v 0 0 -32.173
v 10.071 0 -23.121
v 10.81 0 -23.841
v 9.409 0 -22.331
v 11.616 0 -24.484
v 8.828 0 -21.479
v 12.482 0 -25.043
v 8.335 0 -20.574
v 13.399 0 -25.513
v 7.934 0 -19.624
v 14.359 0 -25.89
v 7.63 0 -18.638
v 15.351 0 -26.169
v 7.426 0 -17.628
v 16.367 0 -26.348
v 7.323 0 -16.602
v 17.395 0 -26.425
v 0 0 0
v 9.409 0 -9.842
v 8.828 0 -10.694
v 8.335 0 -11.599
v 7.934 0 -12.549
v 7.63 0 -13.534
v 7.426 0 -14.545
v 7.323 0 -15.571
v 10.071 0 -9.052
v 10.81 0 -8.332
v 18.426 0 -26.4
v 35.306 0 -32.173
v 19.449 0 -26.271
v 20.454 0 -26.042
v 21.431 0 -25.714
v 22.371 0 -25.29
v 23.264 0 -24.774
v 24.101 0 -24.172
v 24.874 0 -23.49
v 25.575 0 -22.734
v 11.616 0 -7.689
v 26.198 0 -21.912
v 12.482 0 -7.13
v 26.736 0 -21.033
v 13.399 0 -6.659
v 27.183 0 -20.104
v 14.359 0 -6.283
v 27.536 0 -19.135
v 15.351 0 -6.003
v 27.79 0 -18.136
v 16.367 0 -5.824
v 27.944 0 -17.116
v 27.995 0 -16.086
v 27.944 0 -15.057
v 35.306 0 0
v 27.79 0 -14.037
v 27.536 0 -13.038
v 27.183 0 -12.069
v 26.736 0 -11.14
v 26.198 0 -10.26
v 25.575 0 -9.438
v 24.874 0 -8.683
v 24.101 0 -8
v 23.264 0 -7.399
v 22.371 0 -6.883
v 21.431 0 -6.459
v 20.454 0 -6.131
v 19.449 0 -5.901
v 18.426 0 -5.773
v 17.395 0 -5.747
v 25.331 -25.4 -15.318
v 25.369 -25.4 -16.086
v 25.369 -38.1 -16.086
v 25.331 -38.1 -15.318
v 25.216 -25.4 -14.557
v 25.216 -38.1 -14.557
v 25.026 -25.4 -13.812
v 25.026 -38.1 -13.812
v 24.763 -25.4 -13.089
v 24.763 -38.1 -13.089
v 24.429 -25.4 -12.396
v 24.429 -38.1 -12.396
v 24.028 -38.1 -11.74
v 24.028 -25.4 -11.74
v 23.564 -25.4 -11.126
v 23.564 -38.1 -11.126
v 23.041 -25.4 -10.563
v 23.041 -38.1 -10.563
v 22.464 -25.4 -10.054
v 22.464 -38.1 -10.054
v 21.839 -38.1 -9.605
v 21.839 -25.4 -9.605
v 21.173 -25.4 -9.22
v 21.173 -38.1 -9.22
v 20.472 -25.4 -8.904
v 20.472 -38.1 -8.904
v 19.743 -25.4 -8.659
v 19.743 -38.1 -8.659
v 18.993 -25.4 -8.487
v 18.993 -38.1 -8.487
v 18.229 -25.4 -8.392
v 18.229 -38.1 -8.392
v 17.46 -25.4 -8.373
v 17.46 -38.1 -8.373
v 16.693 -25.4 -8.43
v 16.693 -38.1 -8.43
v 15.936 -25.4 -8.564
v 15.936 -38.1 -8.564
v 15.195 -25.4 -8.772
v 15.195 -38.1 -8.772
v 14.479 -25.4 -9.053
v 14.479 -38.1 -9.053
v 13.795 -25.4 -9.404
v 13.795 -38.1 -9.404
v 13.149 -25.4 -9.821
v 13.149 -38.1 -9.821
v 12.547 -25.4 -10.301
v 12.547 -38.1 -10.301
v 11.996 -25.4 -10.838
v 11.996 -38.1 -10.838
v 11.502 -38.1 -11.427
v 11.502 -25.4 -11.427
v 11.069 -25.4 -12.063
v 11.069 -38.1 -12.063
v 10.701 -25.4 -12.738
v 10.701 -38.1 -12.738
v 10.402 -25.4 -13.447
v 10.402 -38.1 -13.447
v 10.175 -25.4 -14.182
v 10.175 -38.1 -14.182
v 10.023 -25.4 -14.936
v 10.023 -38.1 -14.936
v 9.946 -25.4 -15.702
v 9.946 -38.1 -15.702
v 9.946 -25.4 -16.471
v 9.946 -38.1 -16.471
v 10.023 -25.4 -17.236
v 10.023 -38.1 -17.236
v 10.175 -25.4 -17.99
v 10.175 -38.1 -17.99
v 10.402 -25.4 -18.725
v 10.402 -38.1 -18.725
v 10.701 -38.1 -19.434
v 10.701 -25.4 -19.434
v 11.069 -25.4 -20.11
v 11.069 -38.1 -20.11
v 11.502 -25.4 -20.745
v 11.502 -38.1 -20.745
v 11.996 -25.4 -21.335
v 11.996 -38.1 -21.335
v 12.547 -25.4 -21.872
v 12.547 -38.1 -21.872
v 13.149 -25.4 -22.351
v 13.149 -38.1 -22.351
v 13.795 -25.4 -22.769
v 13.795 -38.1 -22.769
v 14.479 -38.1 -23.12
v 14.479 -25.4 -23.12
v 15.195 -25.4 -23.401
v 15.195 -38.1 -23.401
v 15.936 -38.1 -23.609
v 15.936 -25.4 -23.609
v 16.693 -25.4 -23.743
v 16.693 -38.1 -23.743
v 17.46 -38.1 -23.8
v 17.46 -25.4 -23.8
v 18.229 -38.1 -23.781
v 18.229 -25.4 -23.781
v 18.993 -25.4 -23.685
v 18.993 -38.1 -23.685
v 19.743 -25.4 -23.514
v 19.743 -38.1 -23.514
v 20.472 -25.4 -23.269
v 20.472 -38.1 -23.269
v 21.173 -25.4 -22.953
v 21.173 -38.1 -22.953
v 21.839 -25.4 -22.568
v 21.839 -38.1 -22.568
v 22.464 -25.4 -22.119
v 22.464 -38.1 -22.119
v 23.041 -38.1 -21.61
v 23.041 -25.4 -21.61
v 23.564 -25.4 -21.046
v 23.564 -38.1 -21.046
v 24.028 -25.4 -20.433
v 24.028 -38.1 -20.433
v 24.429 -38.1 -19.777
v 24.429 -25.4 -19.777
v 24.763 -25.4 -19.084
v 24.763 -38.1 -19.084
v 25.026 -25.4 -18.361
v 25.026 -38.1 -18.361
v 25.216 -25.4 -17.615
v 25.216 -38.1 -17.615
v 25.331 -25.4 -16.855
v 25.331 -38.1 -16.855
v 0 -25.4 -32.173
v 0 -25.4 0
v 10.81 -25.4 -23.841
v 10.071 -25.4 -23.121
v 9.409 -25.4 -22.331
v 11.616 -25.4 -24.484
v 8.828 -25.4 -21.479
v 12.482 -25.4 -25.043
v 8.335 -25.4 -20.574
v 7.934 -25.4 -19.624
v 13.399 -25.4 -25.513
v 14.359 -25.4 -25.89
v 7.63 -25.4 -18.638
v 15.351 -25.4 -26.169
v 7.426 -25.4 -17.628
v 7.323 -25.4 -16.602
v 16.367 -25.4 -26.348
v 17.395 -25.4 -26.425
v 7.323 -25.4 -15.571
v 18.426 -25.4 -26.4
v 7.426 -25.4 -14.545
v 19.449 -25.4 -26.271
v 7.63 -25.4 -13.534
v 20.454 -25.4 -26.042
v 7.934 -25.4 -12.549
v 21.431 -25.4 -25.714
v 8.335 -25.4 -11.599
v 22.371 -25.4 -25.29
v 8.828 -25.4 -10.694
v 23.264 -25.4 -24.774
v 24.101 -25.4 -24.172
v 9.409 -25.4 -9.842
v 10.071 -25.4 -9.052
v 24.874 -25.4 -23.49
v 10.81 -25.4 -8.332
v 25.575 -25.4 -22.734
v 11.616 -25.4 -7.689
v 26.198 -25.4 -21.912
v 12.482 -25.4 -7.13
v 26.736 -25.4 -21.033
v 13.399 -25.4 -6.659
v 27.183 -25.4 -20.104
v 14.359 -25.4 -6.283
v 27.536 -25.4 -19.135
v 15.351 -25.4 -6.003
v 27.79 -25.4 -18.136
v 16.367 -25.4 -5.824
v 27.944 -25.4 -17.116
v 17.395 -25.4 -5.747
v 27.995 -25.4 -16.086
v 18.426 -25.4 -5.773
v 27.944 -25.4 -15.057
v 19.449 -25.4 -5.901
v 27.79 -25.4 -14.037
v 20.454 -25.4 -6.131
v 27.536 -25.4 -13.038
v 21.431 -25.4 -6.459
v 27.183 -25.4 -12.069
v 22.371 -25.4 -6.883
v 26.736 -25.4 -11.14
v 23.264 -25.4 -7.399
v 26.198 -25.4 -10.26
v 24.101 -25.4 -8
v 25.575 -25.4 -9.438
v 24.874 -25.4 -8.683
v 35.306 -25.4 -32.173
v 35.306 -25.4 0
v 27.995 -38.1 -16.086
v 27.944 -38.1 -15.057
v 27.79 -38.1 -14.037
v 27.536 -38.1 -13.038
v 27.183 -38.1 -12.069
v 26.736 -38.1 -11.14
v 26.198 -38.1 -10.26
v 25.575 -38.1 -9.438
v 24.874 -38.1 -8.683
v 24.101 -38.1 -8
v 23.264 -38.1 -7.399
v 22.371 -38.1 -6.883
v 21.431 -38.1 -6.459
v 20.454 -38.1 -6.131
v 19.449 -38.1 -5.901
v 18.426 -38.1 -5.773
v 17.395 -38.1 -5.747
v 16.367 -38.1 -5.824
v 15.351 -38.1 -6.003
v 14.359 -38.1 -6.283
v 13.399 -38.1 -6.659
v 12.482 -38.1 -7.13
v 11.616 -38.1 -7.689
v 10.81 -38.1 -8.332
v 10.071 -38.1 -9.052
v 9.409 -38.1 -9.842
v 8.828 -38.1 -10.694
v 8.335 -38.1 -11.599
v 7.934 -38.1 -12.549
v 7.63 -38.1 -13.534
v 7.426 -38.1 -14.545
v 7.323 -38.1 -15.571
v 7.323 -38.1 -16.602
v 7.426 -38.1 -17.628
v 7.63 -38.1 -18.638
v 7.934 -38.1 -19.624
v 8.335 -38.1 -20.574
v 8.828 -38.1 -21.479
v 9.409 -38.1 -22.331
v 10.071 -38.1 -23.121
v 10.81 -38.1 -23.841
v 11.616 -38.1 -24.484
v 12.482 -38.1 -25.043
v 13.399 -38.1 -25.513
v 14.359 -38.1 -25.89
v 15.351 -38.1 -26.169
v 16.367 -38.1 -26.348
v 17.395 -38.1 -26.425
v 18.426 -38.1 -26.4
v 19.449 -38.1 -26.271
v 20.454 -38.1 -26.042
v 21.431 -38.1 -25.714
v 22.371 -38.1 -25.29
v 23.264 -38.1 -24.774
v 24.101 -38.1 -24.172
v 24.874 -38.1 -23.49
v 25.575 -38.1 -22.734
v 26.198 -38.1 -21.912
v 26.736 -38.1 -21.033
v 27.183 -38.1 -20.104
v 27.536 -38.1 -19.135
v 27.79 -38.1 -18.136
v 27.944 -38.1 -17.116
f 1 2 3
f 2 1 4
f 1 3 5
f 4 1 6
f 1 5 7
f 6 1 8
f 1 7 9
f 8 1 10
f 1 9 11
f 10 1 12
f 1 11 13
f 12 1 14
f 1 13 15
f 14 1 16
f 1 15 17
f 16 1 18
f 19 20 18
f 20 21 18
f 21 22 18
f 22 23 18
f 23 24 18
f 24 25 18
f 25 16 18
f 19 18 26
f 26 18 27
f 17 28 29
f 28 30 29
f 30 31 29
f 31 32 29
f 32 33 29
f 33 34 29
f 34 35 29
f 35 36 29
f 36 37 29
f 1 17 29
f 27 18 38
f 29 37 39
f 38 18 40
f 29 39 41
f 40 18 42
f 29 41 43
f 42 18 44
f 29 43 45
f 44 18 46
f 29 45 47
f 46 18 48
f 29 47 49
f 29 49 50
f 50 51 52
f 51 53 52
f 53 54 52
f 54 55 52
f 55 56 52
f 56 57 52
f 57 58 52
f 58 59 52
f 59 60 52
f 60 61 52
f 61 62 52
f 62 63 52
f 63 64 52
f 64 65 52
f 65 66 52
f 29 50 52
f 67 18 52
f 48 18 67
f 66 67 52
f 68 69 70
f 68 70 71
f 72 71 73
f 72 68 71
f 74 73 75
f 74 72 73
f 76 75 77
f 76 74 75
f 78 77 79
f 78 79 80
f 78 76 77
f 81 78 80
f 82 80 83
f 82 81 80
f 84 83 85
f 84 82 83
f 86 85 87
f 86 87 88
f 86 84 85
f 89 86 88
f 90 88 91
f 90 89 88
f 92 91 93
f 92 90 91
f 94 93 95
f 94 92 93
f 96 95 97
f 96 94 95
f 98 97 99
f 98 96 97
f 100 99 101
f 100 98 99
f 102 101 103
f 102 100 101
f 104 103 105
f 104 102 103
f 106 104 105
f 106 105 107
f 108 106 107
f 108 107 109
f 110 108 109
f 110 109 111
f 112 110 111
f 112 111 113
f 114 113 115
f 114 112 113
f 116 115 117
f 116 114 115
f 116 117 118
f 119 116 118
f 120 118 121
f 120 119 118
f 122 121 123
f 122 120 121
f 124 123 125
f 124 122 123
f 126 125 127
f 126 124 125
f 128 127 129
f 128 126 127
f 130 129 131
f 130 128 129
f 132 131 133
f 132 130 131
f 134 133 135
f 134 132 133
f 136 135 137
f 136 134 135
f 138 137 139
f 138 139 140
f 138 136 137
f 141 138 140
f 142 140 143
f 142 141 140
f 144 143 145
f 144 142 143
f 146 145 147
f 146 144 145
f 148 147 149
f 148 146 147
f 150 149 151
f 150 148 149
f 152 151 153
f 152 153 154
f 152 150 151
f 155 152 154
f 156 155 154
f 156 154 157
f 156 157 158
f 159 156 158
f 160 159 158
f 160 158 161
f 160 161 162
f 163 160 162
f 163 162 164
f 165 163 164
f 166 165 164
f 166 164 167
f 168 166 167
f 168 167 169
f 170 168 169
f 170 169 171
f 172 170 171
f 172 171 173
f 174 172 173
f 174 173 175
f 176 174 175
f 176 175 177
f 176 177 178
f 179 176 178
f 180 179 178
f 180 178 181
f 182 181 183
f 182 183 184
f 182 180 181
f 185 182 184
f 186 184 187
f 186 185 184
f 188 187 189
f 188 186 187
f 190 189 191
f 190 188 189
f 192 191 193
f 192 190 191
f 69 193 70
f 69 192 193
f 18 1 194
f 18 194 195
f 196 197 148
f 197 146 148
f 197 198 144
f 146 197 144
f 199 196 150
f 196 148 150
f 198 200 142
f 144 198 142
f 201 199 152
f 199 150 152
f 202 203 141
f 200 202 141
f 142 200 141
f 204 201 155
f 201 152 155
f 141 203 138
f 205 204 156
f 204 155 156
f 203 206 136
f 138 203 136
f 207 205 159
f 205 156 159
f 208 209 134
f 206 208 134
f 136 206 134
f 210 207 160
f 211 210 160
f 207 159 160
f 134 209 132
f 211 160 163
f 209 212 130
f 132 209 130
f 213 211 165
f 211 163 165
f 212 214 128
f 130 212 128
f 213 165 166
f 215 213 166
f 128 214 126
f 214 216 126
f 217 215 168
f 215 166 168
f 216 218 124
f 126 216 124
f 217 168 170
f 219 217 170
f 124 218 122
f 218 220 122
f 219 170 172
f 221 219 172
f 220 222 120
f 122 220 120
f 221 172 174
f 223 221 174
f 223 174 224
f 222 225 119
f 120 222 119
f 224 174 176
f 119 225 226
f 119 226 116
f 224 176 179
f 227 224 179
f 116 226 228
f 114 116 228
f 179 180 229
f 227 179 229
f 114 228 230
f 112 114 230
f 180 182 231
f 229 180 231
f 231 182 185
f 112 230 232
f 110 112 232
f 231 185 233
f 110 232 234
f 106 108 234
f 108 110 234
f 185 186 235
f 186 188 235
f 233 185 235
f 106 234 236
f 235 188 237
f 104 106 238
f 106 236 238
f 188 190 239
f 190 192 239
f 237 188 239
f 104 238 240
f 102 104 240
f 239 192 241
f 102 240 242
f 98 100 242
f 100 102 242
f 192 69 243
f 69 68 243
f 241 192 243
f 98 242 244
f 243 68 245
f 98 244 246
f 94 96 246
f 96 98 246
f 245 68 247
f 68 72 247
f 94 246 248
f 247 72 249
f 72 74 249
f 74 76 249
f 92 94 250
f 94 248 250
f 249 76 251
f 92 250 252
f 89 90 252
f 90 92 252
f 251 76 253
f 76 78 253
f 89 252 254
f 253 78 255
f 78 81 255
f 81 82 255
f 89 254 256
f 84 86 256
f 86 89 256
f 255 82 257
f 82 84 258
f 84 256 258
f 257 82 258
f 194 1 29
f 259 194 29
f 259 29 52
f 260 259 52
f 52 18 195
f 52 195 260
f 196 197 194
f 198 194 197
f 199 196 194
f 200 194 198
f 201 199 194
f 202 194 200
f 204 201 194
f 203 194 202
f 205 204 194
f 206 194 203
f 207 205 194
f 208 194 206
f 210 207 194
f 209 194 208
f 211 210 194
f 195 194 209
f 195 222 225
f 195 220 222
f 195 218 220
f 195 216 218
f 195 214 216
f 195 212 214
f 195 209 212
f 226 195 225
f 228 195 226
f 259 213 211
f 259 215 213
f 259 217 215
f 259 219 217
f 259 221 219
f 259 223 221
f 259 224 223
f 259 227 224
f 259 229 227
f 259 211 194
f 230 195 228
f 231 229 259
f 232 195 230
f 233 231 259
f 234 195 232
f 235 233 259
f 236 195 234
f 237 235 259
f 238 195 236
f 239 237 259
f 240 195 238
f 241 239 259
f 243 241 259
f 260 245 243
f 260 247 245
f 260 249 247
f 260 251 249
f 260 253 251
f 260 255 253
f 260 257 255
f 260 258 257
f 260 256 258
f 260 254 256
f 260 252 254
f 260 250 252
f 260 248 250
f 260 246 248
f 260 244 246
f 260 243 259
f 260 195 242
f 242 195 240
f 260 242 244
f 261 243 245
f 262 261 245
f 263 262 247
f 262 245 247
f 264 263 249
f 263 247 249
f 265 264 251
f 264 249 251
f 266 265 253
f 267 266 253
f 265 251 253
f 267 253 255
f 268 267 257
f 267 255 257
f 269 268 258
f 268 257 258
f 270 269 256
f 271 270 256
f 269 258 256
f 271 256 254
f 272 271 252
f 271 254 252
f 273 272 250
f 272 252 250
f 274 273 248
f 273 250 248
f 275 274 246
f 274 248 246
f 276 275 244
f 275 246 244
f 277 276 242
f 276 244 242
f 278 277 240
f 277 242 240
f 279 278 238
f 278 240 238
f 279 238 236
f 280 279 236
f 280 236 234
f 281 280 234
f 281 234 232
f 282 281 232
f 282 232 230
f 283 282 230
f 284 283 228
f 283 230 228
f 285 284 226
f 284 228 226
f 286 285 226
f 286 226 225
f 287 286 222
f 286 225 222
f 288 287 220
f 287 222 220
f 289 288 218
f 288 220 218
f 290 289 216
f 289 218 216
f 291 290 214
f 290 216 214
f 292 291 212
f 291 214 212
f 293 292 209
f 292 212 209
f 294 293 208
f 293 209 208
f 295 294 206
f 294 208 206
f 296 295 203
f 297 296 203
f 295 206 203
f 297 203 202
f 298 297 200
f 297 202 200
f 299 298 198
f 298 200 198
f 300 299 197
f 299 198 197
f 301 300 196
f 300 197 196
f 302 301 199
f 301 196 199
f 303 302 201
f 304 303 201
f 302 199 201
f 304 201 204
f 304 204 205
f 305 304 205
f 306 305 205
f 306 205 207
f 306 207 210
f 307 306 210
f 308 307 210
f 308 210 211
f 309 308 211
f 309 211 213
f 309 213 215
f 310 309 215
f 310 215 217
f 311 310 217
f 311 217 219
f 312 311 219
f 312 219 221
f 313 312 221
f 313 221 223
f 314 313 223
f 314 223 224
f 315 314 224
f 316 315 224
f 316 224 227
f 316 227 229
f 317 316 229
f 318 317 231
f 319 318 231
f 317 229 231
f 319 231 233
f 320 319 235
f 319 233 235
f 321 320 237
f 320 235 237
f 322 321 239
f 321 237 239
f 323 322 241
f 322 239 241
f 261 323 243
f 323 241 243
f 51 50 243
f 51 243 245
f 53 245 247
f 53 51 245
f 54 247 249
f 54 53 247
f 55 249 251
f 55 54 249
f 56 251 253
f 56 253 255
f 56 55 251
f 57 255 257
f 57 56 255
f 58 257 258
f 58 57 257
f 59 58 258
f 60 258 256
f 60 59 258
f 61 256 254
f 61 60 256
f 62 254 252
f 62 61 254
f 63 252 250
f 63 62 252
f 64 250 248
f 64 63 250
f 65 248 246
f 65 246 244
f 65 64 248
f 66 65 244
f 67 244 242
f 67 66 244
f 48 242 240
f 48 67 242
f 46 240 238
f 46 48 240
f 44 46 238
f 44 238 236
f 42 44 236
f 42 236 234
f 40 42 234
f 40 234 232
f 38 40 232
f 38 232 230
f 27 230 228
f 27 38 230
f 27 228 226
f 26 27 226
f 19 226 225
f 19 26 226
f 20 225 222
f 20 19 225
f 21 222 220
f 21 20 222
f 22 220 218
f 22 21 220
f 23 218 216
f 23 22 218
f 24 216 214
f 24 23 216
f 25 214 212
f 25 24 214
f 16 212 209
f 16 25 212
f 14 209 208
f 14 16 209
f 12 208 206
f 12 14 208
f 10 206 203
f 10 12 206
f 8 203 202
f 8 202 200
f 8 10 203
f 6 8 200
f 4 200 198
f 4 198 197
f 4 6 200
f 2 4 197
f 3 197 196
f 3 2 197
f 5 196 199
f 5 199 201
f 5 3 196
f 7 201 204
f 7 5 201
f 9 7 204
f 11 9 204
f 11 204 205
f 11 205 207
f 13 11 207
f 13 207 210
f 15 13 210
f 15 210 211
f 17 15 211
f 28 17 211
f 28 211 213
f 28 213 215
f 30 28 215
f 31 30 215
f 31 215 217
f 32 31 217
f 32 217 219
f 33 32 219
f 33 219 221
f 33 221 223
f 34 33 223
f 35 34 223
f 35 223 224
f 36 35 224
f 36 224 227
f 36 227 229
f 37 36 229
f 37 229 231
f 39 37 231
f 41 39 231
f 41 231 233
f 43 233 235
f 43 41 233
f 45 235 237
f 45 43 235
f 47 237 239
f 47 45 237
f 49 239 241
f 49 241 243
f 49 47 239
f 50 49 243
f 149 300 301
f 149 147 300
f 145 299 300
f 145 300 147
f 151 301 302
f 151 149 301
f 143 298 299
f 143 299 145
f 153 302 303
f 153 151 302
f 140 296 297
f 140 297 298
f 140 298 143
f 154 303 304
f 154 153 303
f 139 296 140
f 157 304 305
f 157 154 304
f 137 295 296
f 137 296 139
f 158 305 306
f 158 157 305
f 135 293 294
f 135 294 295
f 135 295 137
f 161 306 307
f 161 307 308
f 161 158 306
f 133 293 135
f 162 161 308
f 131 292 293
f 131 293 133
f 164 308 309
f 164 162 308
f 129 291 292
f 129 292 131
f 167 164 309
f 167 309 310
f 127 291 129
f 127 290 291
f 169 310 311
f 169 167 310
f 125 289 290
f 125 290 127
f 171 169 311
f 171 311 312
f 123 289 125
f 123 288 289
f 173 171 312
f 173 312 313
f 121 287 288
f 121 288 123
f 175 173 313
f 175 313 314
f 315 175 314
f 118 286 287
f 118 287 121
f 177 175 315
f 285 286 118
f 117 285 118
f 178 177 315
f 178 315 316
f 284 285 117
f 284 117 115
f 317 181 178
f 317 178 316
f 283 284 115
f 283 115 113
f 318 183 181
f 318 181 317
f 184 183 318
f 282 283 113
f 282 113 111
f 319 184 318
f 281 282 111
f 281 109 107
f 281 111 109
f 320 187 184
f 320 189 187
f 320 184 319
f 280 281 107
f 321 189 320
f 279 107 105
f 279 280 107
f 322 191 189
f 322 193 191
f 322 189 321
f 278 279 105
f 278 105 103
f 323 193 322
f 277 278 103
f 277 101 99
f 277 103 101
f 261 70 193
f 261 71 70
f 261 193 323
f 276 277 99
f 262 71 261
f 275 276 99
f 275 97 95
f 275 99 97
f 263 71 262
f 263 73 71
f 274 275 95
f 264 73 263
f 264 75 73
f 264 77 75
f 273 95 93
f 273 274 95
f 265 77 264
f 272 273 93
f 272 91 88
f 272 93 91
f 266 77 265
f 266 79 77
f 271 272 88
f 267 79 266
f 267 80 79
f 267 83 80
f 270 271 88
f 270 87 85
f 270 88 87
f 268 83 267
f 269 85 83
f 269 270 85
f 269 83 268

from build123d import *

# Parameters (mm, degrees)
F0_W     = 35.305619
F0_H     = 32.172695
F0_R     = 10.342233
F1_DEPTH = 25.4
F2_R     = 10.342233
F2_R_2   = 7.716218
F3_DEPTH = 12.7


with BuildPart() as f1:
    # F0 (on Front) → F1 (new body)
    with BuildSketch(Plane.XZ):
        with Locations((17.65281, -16.086347)):
            Rectangle(F0_W, F0_H)
        with Locations((17.65281, -16.086347)):
            Circle(F0_R, mode=Mode.SUBTRACT)
    extrude(amount=F1_DEPTH)


with BuildPart() as f3:
    # F2 (on face) → F3 (new body)
    with BuildSketch(Plane.XZ.offset(25.4)):
        with Locations((17.65281, -16.086347)):
            Circle(F2_R)
        with Locations((17.65281, -16.086347)):
            Circle(F2_R_2, mode=Mode.SUBTRACT)
    extrude(amount=F3_DEPTH)


solid = Compound([f1.part, f3.part])
